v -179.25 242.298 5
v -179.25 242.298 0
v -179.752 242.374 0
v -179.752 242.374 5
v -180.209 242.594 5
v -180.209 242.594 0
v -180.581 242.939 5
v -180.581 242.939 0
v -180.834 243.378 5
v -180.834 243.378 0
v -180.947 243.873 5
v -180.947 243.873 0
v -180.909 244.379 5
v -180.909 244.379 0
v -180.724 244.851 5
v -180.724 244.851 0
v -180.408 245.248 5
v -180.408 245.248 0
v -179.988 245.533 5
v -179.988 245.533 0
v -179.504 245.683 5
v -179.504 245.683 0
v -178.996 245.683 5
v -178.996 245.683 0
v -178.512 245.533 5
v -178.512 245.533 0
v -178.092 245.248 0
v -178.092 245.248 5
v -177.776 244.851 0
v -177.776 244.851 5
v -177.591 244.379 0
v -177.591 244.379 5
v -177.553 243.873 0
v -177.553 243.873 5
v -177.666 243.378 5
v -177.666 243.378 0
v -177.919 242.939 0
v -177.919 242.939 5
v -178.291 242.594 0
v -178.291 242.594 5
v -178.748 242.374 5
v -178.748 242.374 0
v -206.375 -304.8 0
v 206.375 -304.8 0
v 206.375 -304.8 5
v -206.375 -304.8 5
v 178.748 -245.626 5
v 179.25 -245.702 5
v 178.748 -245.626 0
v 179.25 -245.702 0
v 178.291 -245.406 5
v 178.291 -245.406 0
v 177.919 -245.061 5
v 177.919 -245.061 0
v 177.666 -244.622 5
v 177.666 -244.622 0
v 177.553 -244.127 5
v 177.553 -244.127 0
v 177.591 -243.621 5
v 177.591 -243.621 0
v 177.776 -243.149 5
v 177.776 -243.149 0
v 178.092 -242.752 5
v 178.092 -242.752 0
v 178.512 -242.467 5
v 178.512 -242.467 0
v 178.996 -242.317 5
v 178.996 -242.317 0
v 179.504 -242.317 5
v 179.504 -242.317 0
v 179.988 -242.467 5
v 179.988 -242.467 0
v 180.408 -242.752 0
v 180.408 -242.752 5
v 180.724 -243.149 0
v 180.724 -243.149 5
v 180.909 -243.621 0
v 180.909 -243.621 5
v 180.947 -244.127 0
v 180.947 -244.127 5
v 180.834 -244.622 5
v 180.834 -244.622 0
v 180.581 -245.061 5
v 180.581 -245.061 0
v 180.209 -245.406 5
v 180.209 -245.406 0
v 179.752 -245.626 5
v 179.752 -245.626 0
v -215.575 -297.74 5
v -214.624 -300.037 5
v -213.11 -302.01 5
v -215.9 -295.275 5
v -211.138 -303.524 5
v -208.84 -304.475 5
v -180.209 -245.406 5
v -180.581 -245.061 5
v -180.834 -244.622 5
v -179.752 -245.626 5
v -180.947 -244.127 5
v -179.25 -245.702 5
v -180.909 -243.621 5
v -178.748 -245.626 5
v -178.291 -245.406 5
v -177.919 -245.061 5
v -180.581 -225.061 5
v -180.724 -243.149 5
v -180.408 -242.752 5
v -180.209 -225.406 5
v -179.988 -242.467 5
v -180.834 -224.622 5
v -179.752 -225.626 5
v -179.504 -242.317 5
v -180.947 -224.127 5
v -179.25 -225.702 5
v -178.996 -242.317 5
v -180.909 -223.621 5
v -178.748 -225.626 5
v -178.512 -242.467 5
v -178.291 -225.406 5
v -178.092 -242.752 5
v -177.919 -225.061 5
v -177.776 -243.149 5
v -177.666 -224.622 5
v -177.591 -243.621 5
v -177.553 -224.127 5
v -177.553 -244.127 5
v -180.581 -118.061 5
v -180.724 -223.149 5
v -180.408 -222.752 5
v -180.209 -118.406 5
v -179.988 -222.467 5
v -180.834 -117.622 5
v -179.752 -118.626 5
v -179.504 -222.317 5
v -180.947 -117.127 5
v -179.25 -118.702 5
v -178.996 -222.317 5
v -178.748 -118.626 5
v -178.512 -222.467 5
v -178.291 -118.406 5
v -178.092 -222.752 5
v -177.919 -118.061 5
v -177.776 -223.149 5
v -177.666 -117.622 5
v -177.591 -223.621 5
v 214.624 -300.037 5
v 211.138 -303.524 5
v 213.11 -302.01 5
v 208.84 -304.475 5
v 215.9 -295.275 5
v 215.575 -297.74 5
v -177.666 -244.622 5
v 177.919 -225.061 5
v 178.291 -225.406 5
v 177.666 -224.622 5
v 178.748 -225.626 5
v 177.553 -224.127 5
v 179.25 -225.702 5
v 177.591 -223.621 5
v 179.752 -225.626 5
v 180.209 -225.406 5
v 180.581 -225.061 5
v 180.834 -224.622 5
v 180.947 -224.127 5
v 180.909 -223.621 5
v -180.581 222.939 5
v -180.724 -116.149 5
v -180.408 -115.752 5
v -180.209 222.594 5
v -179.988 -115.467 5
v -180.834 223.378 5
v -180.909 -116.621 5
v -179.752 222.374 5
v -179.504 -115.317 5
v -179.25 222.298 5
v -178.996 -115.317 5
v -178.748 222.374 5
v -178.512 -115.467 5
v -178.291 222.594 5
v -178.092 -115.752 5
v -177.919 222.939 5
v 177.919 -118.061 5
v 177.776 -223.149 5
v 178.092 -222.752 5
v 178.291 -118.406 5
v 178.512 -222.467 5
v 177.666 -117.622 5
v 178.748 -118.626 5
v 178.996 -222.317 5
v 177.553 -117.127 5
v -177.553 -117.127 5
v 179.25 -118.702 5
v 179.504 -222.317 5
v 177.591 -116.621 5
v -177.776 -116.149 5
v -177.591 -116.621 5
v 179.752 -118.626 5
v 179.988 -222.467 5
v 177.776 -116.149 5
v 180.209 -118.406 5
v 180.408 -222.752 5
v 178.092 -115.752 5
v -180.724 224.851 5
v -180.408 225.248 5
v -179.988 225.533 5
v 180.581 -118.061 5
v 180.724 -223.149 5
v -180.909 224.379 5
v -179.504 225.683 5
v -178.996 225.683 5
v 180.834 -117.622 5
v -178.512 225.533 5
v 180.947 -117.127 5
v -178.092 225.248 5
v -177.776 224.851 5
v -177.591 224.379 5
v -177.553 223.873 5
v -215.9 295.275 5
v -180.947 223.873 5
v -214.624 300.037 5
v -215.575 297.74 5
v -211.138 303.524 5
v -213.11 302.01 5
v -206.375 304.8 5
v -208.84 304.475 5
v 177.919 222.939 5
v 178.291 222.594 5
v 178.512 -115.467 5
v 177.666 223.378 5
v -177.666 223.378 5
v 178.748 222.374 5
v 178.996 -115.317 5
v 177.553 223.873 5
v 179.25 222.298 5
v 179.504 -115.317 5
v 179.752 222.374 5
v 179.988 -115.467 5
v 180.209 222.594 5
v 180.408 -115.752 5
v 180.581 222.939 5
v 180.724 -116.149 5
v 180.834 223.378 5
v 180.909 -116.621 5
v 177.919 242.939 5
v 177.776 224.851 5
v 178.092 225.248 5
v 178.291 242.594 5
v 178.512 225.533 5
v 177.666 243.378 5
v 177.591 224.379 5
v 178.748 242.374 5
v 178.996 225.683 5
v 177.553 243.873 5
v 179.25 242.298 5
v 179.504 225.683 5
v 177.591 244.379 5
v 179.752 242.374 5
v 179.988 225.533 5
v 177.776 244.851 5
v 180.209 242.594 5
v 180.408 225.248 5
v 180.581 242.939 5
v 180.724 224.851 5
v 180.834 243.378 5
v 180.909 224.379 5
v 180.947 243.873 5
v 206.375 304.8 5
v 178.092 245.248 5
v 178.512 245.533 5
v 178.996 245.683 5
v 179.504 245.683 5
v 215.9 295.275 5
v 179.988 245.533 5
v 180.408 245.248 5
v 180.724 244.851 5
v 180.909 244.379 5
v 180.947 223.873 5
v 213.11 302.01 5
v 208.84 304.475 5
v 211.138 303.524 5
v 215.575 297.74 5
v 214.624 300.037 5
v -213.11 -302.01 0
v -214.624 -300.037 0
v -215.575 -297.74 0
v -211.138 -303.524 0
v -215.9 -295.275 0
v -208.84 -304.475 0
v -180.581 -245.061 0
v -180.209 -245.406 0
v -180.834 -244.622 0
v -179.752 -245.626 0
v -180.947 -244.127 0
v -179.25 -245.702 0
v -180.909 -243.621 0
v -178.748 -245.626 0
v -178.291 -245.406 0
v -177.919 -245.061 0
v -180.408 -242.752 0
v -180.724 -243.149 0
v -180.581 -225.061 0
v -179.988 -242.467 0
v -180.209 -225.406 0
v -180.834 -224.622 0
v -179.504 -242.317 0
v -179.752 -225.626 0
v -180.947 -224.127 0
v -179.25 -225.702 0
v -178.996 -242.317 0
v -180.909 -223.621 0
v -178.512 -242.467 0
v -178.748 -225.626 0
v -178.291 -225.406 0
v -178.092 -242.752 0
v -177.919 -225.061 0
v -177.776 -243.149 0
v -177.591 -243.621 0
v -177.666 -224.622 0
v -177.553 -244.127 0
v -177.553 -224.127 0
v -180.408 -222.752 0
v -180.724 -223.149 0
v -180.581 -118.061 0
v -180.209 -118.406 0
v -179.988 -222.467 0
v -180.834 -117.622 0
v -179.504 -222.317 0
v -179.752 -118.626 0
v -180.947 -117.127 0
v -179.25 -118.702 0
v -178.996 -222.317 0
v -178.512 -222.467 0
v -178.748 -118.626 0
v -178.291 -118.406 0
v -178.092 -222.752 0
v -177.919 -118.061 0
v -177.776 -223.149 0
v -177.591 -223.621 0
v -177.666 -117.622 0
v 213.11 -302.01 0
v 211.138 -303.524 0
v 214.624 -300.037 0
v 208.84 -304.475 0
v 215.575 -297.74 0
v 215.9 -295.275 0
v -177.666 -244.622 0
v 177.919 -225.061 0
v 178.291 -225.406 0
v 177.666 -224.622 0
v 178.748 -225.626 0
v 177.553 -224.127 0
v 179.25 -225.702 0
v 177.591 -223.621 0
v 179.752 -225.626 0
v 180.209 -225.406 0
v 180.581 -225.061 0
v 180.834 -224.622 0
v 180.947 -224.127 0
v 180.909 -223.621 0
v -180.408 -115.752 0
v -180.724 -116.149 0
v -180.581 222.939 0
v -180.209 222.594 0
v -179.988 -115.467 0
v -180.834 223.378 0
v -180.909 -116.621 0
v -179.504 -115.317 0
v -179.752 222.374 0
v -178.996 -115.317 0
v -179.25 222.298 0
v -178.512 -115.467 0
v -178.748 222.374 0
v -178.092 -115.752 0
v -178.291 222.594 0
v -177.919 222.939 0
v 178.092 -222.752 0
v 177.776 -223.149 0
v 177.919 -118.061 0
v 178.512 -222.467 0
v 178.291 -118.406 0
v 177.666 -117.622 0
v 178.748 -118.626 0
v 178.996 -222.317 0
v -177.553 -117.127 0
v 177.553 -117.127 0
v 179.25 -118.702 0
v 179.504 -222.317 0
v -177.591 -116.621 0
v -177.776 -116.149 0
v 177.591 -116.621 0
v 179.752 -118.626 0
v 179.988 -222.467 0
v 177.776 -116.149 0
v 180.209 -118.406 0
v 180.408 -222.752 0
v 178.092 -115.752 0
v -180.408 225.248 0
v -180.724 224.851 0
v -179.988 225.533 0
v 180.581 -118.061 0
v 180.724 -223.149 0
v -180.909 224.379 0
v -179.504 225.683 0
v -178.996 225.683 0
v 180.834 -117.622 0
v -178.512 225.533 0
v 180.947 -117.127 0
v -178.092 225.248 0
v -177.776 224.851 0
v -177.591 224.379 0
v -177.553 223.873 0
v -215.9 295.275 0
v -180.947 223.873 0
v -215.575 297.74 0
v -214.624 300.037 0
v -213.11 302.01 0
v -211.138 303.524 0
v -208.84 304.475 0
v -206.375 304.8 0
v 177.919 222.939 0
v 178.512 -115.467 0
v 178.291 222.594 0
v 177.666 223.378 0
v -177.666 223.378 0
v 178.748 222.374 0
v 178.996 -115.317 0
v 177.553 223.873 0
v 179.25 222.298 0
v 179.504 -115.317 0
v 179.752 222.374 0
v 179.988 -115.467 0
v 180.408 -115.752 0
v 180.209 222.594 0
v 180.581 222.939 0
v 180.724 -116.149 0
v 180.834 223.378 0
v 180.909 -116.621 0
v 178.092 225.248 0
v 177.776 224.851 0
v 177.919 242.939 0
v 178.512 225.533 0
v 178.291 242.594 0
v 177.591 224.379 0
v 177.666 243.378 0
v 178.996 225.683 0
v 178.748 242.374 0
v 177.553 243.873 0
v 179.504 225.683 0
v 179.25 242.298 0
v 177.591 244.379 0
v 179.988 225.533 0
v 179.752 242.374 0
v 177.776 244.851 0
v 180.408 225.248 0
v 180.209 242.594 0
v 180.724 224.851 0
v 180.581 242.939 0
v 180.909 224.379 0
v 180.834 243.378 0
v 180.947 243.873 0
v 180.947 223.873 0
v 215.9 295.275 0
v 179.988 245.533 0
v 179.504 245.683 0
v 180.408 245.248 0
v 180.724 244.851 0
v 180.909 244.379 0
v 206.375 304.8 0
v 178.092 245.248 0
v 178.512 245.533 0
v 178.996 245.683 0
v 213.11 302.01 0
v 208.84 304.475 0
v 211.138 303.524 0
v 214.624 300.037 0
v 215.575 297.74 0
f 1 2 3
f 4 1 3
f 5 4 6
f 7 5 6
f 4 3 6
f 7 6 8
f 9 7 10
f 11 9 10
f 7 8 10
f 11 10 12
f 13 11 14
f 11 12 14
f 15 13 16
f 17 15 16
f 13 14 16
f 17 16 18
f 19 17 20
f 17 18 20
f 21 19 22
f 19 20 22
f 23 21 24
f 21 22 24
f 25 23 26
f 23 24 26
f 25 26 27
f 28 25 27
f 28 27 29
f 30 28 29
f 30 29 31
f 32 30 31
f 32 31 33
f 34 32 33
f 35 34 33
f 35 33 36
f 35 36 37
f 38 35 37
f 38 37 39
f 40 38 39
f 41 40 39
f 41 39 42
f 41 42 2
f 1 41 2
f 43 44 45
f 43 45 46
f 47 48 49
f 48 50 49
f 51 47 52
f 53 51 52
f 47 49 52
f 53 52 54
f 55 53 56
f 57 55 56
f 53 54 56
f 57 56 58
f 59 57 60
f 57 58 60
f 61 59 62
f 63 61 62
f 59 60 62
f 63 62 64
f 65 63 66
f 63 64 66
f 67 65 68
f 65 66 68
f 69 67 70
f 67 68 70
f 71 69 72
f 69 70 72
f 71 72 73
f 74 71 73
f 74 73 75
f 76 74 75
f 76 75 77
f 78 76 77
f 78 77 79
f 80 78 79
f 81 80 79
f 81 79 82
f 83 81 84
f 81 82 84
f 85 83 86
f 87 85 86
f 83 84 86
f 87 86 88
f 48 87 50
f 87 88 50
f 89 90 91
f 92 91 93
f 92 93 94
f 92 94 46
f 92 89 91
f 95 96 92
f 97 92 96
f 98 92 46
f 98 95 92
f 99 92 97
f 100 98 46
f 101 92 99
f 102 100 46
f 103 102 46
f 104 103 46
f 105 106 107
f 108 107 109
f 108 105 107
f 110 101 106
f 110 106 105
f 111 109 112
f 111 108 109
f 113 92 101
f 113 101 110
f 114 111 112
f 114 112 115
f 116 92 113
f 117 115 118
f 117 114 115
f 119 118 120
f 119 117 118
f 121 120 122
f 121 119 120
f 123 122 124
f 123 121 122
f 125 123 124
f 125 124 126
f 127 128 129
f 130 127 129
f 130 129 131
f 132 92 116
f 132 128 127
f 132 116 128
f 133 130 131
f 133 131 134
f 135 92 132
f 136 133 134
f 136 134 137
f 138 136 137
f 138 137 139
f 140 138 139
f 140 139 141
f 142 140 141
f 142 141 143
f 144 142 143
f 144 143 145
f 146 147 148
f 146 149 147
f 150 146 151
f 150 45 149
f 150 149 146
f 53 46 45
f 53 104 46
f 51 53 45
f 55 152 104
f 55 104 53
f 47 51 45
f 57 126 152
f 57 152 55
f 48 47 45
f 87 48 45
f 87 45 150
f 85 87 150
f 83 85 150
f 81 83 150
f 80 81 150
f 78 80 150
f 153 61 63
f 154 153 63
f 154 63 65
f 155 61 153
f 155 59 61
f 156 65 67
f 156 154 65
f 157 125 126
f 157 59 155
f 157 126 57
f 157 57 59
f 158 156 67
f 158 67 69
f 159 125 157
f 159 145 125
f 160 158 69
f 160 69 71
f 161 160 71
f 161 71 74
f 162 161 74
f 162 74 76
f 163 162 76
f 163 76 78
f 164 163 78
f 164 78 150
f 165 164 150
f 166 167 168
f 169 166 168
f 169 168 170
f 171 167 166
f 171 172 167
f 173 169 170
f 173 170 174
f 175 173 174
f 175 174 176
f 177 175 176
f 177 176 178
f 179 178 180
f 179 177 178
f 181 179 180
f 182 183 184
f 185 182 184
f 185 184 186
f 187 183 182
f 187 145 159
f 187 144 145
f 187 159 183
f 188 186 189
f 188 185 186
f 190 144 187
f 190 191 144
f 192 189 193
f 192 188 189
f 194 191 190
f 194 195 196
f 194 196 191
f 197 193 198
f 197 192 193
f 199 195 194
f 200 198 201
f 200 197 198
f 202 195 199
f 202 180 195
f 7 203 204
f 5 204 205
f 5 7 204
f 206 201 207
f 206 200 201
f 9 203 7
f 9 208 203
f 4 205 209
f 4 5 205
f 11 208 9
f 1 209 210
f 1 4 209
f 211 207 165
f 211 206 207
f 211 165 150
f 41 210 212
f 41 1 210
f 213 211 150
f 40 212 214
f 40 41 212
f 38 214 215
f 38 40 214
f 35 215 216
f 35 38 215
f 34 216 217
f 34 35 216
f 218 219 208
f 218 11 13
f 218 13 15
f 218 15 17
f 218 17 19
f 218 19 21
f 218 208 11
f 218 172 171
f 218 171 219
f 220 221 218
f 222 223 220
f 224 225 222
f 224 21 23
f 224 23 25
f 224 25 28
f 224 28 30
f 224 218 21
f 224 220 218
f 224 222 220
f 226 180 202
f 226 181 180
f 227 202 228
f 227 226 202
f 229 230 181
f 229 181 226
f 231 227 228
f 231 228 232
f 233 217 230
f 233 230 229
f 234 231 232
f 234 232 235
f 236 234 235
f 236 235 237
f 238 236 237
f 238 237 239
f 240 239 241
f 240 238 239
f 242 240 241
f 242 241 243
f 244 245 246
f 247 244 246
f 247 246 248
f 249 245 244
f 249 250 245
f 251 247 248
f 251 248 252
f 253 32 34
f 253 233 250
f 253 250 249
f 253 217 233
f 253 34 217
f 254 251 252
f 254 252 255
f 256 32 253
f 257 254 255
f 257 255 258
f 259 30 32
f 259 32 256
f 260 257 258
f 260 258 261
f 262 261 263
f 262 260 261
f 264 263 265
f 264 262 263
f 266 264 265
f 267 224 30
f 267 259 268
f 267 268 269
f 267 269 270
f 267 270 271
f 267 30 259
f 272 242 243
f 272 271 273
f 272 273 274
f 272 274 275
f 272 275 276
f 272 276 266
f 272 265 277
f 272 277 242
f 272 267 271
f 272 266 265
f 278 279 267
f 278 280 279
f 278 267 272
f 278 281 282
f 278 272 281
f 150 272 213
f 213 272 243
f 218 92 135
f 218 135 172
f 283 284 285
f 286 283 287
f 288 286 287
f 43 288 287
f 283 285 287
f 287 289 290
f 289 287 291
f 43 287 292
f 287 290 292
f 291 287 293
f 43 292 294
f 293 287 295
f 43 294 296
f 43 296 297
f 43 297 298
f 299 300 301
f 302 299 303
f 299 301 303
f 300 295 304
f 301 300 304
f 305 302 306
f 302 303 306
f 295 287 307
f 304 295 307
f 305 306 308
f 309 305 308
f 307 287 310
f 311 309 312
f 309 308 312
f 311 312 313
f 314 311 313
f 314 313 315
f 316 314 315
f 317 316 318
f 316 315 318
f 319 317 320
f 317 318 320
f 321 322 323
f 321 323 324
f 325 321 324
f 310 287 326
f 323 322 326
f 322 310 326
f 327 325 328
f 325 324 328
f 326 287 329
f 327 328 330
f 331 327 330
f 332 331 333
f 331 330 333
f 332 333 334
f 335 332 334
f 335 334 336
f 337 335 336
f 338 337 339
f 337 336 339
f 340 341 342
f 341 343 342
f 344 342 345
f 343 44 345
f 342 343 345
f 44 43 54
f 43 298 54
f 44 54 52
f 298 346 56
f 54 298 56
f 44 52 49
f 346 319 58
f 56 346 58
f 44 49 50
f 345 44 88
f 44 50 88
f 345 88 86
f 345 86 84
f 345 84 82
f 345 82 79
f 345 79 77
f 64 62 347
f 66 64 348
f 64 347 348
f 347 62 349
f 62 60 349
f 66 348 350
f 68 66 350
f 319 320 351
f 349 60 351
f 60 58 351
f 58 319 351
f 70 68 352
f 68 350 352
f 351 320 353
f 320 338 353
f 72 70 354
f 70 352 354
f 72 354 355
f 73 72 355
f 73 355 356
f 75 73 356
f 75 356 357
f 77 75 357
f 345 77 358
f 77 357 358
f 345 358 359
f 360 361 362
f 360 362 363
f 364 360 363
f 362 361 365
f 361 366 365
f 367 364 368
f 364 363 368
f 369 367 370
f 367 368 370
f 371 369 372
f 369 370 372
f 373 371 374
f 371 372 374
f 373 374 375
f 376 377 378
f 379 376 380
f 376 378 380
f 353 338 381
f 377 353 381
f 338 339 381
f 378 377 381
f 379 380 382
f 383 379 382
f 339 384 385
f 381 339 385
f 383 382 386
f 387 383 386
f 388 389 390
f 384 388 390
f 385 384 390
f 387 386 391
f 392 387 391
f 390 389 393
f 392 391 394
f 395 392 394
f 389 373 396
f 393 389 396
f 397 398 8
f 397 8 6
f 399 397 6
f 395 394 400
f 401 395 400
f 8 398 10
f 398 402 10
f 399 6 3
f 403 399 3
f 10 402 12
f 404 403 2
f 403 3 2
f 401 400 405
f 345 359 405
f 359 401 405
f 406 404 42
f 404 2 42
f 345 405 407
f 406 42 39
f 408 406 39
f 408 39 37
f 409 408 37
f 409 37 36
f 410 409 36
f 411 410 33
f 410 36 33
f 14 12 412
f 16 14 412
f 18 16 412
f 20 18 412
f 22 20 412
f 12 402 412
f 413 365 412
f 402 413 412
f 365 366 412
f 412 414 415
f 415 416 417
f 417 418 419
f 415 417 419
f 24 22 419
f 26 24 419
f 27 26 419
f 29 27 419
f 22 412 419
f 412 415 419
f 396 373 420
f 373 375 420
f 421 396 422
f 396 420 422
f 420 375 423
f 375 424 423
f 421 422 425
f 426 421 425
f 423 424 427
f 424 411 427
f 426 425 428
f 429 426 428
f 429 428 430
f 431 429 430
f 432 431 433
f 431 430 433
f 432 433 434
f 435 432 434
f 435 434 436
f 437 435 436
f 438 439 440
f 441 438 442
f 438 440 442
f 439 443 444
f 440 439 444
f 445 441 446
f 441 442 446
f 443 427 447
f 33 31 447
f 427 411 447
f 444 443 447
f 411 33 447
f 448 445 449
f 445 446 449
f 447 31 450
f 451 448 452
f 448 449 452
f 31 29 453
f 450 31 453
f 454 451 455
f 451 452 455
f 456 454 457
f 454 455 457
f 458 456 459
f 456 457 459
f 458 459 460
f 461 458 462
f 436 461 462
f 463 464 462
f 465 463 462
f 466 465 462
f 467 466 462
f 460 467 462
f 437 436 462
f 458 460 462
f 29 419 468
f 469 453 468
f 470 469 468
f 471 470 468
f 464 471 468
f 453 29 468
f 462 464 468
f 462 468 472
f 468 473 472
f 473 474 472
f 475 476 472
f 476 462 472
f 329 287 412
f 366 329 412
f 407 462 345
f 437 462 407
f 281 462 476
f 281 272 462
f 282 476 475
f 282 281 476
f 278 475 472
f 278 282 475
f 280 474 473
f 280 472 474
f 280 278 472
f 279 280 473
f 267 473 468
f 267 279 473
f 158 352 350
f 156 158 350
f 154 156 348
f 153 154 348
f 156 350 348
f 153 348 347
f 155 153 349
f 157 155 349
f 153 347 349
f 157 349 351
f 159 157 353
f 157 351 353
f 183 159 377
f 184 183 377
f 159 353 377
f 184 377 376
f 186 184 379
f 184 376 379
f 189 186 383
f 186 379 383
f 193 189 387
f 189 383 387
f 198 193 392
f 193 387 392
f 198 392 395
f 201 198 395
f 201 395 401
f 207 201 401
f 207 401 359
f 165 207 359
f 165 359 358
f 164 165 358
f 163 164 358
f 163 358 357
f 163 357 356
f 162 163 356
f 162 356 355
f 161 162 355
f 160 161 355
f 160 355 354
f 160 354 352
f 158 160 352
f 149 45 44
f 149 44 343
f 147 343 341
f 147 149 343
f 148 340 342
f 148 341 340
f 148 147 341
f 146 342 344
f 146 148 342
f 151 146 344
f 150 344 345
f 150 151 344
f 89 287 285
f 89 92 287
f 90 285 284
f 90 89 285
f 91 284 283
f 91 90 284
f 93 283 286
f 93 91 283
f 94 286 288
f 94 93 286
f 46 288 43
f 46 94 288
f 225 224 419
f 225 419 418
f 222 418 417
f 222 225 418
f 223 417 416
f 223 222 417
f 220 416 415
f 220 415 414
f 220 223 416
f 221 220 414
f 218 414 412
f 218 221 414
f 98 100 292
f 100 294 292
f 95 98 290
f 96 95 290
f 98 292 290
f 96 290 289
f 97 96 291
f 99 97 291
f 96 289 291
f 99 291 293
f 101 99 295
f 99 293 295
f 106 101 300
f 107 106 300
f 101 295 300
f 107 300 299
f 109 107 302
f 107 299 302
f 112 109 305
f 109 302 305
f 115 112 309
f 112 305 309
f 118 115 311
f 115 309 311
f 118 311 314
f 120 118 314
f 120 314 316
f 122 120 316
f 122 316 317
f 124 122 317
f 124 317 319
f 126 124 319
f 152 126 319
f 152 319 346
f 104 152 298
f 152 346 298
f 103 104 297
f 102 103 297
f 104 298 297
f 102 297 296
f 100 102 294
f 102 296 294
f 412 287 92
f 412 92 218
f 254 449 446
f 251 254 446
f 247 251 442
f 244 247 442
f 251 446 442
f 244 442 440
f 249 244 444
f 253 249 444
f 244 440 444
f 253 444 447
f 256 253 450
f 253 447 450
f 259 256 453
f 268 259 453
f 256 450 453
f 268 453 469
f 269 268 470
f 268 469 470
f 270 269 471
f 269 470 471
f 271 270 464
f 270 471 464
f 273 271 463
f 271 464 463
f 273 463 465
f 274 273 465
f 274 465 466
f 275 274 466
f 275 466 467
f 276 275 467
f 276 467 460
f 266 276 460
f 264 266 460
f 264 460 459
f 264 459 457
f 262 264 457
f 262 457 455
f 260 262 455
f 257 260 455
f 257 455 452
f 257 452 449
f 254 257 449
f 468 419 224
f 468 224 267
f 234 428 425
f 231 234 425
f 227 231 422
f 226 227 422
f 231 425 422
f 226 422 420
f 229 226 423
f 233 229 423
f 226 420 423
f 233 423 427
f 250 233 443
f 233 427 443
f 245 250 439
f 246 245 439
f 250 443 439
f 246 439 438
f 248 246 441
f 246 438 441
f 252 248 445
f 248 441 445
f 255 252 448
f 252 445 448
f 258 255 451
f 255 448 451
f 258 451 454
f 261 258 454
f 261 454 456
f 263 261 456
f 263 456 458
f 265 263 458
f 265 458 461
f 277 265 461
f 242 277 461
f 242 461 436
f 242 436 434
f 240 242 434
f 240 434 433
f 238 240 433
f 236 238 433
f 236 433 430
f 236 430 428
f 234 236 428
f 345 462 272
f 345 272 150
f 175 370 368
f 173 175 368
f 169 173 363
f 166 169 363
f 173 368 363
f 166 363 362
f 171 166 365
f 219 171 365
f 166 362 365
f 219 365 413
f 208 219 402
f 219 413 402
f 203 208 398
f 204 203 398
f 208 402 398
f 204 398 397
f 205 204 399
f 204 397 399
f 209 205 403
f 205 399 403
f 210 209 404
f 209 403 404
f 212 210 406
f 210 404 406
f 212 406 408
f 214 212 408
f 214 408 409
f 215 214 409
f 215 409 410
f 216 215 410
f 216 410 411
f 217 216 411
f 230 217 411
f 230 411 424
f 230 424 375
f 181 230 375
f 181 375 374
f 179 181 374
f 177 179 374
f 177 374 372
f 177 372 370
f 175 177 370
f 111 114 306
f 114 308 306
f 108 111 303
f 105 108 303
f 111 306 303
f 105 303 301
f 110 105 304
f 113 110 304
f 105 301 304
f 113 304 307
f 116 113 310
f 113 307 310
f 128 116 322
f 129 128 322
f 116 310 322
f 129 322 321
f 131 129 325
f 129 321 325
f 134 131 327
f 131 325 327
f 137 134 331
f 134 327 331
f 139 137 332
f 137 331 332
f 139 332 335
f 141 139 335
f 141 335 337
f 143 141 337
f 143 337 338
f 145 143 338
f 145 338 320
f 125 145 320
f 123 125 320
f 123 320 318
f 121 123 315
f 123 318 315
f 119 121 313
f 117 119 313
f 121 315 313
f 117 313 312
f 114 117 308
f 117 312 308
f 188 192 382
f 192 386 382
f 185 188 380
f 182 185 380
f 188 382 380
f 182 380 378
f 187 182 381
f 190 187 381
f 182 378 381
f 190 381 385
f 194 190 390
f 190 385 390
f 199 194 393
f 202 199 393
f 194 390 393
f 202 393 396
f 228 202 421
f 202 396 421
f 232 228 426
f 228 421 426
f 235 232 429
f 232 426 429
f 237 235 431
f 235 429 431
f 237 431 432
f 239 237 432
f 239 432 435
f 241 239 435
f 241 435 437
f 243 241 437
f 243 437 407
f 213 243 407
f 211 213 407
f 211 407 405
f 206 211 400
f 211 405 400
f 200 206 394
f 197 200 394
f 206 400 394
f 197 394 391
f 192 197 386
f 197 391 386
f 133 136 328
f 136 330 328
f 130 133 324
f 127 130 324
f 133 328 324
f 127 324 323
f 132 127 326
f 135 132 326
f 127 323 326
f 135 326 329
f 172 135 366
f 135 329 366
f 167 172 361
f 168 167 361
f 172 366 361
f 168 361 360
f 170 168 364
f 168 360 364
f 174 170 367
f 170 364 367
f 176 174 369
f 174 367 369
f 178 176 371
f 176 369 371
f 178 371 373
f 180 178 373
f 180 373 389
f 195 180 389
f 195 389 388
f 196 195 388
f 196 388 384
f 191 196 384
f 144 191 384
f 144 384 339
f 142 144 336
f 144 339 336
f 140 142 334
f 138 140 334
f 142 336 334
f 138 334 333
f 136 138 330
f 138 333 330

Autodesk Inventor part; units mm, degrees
ref_plane "YZ Plane" through (0, 0, 0) normal (1, 0, 0) x (0, 1, 0)
ref_plane "XZ Plane" through (0, 0, 0) normal (0, 1, 0) x (-1, 0, 0)
ref_plane "XY Plane" through (0, 0, 0) normal (0, 0, 1) x (1, 0, 0)
sketch "Sketch1" plane through (0, 0, 0) normal (0, 0, 1) x (1, 0, 0)
  line L0 (-215.9, 304.8) -> (215.9, 304.8)
  line L1 (215.9, 304.8) -> (215.9, -304.8)
  line L2 (215.9, -304.8) -> (-215.9, -304.8)
  line L3 (-215.9, -304.8) -> (-215.9, 304.8)
  point P0 (0, 0)
  dimension "d0" = 431.8
  dimension "d1" = 609.6
  dimension "d2" = 304.8
  dimension "d3" = 215.9
extrude "Extrusion1" add sketch "Sketch1" along normal blind 5
sketch "Sketch2" plane through (0, 0, 5) normal (0, 0, 1) x (1, 0, 0)
  line L0 (-215.9, -304.8) -> (215.9, -304.8) projected
  line L1 (-215.9, 304.8) -> (-215.9, -304.8) projected
  line L2 (215.9, 304.8) -> (-215.9, 304.8) projected
  line L3 (215.9, -304.8) -> (215.9, 304.8) projected
  point P0 (0, 0)
  point P1 (-179.25, -244)
  point P2 (-179.25, -224)
  point P3 (179.25, -244)
  point P4 (179.25, -224)
  point P5 (179.25, 224)
  point P6 (179.25, 244)
  point P7 (-179.25, 224)
  point P8 (-179.25, 244)
  point P9 (179.25, -117)
  point P10 (-179.25, -117)
  dimension "d6" = 20
  dimension "d7" = 60.8
  dimension "d8" = 36.65
  dimension "d16" = 20
  dimension "d17" = 60.8
  dimension "d18" = 36.65
  dimension "d20" = 127
hole "Hole1" at (-179.25, -244, 5) at (-179.25, -224, 5) at (-179.25, 224, 5) at (-179.25, 244, 5) at (179.25, 224, 5) at (179.25, 244, 5) at (179.25, -244, 5) at (179.25, -224, 5) at (179.25, -117, 5) at (-179.25, -117, 5) direction (0, 0, -1) diameter 3.4036 end through all clearance for "Flat Head Machine Screw" size "M3" standard "Ansi Metric M Profile"
fillet "Fillet1" radius 9.525 4 edges at (215.9, -304.8, 2.5) (-215.9, -304.8, 2.5) (215.9, 304.8, 2.5) (-215.9, 304.8, 2.5)
equation "\"d2\" = 0.5 * d1"
equation "\"d3\" = 0.5 * d0"
equation "\"d16\" = d6"
equation "\"d17\" = d7"
equation "\"d18\" = d8"
